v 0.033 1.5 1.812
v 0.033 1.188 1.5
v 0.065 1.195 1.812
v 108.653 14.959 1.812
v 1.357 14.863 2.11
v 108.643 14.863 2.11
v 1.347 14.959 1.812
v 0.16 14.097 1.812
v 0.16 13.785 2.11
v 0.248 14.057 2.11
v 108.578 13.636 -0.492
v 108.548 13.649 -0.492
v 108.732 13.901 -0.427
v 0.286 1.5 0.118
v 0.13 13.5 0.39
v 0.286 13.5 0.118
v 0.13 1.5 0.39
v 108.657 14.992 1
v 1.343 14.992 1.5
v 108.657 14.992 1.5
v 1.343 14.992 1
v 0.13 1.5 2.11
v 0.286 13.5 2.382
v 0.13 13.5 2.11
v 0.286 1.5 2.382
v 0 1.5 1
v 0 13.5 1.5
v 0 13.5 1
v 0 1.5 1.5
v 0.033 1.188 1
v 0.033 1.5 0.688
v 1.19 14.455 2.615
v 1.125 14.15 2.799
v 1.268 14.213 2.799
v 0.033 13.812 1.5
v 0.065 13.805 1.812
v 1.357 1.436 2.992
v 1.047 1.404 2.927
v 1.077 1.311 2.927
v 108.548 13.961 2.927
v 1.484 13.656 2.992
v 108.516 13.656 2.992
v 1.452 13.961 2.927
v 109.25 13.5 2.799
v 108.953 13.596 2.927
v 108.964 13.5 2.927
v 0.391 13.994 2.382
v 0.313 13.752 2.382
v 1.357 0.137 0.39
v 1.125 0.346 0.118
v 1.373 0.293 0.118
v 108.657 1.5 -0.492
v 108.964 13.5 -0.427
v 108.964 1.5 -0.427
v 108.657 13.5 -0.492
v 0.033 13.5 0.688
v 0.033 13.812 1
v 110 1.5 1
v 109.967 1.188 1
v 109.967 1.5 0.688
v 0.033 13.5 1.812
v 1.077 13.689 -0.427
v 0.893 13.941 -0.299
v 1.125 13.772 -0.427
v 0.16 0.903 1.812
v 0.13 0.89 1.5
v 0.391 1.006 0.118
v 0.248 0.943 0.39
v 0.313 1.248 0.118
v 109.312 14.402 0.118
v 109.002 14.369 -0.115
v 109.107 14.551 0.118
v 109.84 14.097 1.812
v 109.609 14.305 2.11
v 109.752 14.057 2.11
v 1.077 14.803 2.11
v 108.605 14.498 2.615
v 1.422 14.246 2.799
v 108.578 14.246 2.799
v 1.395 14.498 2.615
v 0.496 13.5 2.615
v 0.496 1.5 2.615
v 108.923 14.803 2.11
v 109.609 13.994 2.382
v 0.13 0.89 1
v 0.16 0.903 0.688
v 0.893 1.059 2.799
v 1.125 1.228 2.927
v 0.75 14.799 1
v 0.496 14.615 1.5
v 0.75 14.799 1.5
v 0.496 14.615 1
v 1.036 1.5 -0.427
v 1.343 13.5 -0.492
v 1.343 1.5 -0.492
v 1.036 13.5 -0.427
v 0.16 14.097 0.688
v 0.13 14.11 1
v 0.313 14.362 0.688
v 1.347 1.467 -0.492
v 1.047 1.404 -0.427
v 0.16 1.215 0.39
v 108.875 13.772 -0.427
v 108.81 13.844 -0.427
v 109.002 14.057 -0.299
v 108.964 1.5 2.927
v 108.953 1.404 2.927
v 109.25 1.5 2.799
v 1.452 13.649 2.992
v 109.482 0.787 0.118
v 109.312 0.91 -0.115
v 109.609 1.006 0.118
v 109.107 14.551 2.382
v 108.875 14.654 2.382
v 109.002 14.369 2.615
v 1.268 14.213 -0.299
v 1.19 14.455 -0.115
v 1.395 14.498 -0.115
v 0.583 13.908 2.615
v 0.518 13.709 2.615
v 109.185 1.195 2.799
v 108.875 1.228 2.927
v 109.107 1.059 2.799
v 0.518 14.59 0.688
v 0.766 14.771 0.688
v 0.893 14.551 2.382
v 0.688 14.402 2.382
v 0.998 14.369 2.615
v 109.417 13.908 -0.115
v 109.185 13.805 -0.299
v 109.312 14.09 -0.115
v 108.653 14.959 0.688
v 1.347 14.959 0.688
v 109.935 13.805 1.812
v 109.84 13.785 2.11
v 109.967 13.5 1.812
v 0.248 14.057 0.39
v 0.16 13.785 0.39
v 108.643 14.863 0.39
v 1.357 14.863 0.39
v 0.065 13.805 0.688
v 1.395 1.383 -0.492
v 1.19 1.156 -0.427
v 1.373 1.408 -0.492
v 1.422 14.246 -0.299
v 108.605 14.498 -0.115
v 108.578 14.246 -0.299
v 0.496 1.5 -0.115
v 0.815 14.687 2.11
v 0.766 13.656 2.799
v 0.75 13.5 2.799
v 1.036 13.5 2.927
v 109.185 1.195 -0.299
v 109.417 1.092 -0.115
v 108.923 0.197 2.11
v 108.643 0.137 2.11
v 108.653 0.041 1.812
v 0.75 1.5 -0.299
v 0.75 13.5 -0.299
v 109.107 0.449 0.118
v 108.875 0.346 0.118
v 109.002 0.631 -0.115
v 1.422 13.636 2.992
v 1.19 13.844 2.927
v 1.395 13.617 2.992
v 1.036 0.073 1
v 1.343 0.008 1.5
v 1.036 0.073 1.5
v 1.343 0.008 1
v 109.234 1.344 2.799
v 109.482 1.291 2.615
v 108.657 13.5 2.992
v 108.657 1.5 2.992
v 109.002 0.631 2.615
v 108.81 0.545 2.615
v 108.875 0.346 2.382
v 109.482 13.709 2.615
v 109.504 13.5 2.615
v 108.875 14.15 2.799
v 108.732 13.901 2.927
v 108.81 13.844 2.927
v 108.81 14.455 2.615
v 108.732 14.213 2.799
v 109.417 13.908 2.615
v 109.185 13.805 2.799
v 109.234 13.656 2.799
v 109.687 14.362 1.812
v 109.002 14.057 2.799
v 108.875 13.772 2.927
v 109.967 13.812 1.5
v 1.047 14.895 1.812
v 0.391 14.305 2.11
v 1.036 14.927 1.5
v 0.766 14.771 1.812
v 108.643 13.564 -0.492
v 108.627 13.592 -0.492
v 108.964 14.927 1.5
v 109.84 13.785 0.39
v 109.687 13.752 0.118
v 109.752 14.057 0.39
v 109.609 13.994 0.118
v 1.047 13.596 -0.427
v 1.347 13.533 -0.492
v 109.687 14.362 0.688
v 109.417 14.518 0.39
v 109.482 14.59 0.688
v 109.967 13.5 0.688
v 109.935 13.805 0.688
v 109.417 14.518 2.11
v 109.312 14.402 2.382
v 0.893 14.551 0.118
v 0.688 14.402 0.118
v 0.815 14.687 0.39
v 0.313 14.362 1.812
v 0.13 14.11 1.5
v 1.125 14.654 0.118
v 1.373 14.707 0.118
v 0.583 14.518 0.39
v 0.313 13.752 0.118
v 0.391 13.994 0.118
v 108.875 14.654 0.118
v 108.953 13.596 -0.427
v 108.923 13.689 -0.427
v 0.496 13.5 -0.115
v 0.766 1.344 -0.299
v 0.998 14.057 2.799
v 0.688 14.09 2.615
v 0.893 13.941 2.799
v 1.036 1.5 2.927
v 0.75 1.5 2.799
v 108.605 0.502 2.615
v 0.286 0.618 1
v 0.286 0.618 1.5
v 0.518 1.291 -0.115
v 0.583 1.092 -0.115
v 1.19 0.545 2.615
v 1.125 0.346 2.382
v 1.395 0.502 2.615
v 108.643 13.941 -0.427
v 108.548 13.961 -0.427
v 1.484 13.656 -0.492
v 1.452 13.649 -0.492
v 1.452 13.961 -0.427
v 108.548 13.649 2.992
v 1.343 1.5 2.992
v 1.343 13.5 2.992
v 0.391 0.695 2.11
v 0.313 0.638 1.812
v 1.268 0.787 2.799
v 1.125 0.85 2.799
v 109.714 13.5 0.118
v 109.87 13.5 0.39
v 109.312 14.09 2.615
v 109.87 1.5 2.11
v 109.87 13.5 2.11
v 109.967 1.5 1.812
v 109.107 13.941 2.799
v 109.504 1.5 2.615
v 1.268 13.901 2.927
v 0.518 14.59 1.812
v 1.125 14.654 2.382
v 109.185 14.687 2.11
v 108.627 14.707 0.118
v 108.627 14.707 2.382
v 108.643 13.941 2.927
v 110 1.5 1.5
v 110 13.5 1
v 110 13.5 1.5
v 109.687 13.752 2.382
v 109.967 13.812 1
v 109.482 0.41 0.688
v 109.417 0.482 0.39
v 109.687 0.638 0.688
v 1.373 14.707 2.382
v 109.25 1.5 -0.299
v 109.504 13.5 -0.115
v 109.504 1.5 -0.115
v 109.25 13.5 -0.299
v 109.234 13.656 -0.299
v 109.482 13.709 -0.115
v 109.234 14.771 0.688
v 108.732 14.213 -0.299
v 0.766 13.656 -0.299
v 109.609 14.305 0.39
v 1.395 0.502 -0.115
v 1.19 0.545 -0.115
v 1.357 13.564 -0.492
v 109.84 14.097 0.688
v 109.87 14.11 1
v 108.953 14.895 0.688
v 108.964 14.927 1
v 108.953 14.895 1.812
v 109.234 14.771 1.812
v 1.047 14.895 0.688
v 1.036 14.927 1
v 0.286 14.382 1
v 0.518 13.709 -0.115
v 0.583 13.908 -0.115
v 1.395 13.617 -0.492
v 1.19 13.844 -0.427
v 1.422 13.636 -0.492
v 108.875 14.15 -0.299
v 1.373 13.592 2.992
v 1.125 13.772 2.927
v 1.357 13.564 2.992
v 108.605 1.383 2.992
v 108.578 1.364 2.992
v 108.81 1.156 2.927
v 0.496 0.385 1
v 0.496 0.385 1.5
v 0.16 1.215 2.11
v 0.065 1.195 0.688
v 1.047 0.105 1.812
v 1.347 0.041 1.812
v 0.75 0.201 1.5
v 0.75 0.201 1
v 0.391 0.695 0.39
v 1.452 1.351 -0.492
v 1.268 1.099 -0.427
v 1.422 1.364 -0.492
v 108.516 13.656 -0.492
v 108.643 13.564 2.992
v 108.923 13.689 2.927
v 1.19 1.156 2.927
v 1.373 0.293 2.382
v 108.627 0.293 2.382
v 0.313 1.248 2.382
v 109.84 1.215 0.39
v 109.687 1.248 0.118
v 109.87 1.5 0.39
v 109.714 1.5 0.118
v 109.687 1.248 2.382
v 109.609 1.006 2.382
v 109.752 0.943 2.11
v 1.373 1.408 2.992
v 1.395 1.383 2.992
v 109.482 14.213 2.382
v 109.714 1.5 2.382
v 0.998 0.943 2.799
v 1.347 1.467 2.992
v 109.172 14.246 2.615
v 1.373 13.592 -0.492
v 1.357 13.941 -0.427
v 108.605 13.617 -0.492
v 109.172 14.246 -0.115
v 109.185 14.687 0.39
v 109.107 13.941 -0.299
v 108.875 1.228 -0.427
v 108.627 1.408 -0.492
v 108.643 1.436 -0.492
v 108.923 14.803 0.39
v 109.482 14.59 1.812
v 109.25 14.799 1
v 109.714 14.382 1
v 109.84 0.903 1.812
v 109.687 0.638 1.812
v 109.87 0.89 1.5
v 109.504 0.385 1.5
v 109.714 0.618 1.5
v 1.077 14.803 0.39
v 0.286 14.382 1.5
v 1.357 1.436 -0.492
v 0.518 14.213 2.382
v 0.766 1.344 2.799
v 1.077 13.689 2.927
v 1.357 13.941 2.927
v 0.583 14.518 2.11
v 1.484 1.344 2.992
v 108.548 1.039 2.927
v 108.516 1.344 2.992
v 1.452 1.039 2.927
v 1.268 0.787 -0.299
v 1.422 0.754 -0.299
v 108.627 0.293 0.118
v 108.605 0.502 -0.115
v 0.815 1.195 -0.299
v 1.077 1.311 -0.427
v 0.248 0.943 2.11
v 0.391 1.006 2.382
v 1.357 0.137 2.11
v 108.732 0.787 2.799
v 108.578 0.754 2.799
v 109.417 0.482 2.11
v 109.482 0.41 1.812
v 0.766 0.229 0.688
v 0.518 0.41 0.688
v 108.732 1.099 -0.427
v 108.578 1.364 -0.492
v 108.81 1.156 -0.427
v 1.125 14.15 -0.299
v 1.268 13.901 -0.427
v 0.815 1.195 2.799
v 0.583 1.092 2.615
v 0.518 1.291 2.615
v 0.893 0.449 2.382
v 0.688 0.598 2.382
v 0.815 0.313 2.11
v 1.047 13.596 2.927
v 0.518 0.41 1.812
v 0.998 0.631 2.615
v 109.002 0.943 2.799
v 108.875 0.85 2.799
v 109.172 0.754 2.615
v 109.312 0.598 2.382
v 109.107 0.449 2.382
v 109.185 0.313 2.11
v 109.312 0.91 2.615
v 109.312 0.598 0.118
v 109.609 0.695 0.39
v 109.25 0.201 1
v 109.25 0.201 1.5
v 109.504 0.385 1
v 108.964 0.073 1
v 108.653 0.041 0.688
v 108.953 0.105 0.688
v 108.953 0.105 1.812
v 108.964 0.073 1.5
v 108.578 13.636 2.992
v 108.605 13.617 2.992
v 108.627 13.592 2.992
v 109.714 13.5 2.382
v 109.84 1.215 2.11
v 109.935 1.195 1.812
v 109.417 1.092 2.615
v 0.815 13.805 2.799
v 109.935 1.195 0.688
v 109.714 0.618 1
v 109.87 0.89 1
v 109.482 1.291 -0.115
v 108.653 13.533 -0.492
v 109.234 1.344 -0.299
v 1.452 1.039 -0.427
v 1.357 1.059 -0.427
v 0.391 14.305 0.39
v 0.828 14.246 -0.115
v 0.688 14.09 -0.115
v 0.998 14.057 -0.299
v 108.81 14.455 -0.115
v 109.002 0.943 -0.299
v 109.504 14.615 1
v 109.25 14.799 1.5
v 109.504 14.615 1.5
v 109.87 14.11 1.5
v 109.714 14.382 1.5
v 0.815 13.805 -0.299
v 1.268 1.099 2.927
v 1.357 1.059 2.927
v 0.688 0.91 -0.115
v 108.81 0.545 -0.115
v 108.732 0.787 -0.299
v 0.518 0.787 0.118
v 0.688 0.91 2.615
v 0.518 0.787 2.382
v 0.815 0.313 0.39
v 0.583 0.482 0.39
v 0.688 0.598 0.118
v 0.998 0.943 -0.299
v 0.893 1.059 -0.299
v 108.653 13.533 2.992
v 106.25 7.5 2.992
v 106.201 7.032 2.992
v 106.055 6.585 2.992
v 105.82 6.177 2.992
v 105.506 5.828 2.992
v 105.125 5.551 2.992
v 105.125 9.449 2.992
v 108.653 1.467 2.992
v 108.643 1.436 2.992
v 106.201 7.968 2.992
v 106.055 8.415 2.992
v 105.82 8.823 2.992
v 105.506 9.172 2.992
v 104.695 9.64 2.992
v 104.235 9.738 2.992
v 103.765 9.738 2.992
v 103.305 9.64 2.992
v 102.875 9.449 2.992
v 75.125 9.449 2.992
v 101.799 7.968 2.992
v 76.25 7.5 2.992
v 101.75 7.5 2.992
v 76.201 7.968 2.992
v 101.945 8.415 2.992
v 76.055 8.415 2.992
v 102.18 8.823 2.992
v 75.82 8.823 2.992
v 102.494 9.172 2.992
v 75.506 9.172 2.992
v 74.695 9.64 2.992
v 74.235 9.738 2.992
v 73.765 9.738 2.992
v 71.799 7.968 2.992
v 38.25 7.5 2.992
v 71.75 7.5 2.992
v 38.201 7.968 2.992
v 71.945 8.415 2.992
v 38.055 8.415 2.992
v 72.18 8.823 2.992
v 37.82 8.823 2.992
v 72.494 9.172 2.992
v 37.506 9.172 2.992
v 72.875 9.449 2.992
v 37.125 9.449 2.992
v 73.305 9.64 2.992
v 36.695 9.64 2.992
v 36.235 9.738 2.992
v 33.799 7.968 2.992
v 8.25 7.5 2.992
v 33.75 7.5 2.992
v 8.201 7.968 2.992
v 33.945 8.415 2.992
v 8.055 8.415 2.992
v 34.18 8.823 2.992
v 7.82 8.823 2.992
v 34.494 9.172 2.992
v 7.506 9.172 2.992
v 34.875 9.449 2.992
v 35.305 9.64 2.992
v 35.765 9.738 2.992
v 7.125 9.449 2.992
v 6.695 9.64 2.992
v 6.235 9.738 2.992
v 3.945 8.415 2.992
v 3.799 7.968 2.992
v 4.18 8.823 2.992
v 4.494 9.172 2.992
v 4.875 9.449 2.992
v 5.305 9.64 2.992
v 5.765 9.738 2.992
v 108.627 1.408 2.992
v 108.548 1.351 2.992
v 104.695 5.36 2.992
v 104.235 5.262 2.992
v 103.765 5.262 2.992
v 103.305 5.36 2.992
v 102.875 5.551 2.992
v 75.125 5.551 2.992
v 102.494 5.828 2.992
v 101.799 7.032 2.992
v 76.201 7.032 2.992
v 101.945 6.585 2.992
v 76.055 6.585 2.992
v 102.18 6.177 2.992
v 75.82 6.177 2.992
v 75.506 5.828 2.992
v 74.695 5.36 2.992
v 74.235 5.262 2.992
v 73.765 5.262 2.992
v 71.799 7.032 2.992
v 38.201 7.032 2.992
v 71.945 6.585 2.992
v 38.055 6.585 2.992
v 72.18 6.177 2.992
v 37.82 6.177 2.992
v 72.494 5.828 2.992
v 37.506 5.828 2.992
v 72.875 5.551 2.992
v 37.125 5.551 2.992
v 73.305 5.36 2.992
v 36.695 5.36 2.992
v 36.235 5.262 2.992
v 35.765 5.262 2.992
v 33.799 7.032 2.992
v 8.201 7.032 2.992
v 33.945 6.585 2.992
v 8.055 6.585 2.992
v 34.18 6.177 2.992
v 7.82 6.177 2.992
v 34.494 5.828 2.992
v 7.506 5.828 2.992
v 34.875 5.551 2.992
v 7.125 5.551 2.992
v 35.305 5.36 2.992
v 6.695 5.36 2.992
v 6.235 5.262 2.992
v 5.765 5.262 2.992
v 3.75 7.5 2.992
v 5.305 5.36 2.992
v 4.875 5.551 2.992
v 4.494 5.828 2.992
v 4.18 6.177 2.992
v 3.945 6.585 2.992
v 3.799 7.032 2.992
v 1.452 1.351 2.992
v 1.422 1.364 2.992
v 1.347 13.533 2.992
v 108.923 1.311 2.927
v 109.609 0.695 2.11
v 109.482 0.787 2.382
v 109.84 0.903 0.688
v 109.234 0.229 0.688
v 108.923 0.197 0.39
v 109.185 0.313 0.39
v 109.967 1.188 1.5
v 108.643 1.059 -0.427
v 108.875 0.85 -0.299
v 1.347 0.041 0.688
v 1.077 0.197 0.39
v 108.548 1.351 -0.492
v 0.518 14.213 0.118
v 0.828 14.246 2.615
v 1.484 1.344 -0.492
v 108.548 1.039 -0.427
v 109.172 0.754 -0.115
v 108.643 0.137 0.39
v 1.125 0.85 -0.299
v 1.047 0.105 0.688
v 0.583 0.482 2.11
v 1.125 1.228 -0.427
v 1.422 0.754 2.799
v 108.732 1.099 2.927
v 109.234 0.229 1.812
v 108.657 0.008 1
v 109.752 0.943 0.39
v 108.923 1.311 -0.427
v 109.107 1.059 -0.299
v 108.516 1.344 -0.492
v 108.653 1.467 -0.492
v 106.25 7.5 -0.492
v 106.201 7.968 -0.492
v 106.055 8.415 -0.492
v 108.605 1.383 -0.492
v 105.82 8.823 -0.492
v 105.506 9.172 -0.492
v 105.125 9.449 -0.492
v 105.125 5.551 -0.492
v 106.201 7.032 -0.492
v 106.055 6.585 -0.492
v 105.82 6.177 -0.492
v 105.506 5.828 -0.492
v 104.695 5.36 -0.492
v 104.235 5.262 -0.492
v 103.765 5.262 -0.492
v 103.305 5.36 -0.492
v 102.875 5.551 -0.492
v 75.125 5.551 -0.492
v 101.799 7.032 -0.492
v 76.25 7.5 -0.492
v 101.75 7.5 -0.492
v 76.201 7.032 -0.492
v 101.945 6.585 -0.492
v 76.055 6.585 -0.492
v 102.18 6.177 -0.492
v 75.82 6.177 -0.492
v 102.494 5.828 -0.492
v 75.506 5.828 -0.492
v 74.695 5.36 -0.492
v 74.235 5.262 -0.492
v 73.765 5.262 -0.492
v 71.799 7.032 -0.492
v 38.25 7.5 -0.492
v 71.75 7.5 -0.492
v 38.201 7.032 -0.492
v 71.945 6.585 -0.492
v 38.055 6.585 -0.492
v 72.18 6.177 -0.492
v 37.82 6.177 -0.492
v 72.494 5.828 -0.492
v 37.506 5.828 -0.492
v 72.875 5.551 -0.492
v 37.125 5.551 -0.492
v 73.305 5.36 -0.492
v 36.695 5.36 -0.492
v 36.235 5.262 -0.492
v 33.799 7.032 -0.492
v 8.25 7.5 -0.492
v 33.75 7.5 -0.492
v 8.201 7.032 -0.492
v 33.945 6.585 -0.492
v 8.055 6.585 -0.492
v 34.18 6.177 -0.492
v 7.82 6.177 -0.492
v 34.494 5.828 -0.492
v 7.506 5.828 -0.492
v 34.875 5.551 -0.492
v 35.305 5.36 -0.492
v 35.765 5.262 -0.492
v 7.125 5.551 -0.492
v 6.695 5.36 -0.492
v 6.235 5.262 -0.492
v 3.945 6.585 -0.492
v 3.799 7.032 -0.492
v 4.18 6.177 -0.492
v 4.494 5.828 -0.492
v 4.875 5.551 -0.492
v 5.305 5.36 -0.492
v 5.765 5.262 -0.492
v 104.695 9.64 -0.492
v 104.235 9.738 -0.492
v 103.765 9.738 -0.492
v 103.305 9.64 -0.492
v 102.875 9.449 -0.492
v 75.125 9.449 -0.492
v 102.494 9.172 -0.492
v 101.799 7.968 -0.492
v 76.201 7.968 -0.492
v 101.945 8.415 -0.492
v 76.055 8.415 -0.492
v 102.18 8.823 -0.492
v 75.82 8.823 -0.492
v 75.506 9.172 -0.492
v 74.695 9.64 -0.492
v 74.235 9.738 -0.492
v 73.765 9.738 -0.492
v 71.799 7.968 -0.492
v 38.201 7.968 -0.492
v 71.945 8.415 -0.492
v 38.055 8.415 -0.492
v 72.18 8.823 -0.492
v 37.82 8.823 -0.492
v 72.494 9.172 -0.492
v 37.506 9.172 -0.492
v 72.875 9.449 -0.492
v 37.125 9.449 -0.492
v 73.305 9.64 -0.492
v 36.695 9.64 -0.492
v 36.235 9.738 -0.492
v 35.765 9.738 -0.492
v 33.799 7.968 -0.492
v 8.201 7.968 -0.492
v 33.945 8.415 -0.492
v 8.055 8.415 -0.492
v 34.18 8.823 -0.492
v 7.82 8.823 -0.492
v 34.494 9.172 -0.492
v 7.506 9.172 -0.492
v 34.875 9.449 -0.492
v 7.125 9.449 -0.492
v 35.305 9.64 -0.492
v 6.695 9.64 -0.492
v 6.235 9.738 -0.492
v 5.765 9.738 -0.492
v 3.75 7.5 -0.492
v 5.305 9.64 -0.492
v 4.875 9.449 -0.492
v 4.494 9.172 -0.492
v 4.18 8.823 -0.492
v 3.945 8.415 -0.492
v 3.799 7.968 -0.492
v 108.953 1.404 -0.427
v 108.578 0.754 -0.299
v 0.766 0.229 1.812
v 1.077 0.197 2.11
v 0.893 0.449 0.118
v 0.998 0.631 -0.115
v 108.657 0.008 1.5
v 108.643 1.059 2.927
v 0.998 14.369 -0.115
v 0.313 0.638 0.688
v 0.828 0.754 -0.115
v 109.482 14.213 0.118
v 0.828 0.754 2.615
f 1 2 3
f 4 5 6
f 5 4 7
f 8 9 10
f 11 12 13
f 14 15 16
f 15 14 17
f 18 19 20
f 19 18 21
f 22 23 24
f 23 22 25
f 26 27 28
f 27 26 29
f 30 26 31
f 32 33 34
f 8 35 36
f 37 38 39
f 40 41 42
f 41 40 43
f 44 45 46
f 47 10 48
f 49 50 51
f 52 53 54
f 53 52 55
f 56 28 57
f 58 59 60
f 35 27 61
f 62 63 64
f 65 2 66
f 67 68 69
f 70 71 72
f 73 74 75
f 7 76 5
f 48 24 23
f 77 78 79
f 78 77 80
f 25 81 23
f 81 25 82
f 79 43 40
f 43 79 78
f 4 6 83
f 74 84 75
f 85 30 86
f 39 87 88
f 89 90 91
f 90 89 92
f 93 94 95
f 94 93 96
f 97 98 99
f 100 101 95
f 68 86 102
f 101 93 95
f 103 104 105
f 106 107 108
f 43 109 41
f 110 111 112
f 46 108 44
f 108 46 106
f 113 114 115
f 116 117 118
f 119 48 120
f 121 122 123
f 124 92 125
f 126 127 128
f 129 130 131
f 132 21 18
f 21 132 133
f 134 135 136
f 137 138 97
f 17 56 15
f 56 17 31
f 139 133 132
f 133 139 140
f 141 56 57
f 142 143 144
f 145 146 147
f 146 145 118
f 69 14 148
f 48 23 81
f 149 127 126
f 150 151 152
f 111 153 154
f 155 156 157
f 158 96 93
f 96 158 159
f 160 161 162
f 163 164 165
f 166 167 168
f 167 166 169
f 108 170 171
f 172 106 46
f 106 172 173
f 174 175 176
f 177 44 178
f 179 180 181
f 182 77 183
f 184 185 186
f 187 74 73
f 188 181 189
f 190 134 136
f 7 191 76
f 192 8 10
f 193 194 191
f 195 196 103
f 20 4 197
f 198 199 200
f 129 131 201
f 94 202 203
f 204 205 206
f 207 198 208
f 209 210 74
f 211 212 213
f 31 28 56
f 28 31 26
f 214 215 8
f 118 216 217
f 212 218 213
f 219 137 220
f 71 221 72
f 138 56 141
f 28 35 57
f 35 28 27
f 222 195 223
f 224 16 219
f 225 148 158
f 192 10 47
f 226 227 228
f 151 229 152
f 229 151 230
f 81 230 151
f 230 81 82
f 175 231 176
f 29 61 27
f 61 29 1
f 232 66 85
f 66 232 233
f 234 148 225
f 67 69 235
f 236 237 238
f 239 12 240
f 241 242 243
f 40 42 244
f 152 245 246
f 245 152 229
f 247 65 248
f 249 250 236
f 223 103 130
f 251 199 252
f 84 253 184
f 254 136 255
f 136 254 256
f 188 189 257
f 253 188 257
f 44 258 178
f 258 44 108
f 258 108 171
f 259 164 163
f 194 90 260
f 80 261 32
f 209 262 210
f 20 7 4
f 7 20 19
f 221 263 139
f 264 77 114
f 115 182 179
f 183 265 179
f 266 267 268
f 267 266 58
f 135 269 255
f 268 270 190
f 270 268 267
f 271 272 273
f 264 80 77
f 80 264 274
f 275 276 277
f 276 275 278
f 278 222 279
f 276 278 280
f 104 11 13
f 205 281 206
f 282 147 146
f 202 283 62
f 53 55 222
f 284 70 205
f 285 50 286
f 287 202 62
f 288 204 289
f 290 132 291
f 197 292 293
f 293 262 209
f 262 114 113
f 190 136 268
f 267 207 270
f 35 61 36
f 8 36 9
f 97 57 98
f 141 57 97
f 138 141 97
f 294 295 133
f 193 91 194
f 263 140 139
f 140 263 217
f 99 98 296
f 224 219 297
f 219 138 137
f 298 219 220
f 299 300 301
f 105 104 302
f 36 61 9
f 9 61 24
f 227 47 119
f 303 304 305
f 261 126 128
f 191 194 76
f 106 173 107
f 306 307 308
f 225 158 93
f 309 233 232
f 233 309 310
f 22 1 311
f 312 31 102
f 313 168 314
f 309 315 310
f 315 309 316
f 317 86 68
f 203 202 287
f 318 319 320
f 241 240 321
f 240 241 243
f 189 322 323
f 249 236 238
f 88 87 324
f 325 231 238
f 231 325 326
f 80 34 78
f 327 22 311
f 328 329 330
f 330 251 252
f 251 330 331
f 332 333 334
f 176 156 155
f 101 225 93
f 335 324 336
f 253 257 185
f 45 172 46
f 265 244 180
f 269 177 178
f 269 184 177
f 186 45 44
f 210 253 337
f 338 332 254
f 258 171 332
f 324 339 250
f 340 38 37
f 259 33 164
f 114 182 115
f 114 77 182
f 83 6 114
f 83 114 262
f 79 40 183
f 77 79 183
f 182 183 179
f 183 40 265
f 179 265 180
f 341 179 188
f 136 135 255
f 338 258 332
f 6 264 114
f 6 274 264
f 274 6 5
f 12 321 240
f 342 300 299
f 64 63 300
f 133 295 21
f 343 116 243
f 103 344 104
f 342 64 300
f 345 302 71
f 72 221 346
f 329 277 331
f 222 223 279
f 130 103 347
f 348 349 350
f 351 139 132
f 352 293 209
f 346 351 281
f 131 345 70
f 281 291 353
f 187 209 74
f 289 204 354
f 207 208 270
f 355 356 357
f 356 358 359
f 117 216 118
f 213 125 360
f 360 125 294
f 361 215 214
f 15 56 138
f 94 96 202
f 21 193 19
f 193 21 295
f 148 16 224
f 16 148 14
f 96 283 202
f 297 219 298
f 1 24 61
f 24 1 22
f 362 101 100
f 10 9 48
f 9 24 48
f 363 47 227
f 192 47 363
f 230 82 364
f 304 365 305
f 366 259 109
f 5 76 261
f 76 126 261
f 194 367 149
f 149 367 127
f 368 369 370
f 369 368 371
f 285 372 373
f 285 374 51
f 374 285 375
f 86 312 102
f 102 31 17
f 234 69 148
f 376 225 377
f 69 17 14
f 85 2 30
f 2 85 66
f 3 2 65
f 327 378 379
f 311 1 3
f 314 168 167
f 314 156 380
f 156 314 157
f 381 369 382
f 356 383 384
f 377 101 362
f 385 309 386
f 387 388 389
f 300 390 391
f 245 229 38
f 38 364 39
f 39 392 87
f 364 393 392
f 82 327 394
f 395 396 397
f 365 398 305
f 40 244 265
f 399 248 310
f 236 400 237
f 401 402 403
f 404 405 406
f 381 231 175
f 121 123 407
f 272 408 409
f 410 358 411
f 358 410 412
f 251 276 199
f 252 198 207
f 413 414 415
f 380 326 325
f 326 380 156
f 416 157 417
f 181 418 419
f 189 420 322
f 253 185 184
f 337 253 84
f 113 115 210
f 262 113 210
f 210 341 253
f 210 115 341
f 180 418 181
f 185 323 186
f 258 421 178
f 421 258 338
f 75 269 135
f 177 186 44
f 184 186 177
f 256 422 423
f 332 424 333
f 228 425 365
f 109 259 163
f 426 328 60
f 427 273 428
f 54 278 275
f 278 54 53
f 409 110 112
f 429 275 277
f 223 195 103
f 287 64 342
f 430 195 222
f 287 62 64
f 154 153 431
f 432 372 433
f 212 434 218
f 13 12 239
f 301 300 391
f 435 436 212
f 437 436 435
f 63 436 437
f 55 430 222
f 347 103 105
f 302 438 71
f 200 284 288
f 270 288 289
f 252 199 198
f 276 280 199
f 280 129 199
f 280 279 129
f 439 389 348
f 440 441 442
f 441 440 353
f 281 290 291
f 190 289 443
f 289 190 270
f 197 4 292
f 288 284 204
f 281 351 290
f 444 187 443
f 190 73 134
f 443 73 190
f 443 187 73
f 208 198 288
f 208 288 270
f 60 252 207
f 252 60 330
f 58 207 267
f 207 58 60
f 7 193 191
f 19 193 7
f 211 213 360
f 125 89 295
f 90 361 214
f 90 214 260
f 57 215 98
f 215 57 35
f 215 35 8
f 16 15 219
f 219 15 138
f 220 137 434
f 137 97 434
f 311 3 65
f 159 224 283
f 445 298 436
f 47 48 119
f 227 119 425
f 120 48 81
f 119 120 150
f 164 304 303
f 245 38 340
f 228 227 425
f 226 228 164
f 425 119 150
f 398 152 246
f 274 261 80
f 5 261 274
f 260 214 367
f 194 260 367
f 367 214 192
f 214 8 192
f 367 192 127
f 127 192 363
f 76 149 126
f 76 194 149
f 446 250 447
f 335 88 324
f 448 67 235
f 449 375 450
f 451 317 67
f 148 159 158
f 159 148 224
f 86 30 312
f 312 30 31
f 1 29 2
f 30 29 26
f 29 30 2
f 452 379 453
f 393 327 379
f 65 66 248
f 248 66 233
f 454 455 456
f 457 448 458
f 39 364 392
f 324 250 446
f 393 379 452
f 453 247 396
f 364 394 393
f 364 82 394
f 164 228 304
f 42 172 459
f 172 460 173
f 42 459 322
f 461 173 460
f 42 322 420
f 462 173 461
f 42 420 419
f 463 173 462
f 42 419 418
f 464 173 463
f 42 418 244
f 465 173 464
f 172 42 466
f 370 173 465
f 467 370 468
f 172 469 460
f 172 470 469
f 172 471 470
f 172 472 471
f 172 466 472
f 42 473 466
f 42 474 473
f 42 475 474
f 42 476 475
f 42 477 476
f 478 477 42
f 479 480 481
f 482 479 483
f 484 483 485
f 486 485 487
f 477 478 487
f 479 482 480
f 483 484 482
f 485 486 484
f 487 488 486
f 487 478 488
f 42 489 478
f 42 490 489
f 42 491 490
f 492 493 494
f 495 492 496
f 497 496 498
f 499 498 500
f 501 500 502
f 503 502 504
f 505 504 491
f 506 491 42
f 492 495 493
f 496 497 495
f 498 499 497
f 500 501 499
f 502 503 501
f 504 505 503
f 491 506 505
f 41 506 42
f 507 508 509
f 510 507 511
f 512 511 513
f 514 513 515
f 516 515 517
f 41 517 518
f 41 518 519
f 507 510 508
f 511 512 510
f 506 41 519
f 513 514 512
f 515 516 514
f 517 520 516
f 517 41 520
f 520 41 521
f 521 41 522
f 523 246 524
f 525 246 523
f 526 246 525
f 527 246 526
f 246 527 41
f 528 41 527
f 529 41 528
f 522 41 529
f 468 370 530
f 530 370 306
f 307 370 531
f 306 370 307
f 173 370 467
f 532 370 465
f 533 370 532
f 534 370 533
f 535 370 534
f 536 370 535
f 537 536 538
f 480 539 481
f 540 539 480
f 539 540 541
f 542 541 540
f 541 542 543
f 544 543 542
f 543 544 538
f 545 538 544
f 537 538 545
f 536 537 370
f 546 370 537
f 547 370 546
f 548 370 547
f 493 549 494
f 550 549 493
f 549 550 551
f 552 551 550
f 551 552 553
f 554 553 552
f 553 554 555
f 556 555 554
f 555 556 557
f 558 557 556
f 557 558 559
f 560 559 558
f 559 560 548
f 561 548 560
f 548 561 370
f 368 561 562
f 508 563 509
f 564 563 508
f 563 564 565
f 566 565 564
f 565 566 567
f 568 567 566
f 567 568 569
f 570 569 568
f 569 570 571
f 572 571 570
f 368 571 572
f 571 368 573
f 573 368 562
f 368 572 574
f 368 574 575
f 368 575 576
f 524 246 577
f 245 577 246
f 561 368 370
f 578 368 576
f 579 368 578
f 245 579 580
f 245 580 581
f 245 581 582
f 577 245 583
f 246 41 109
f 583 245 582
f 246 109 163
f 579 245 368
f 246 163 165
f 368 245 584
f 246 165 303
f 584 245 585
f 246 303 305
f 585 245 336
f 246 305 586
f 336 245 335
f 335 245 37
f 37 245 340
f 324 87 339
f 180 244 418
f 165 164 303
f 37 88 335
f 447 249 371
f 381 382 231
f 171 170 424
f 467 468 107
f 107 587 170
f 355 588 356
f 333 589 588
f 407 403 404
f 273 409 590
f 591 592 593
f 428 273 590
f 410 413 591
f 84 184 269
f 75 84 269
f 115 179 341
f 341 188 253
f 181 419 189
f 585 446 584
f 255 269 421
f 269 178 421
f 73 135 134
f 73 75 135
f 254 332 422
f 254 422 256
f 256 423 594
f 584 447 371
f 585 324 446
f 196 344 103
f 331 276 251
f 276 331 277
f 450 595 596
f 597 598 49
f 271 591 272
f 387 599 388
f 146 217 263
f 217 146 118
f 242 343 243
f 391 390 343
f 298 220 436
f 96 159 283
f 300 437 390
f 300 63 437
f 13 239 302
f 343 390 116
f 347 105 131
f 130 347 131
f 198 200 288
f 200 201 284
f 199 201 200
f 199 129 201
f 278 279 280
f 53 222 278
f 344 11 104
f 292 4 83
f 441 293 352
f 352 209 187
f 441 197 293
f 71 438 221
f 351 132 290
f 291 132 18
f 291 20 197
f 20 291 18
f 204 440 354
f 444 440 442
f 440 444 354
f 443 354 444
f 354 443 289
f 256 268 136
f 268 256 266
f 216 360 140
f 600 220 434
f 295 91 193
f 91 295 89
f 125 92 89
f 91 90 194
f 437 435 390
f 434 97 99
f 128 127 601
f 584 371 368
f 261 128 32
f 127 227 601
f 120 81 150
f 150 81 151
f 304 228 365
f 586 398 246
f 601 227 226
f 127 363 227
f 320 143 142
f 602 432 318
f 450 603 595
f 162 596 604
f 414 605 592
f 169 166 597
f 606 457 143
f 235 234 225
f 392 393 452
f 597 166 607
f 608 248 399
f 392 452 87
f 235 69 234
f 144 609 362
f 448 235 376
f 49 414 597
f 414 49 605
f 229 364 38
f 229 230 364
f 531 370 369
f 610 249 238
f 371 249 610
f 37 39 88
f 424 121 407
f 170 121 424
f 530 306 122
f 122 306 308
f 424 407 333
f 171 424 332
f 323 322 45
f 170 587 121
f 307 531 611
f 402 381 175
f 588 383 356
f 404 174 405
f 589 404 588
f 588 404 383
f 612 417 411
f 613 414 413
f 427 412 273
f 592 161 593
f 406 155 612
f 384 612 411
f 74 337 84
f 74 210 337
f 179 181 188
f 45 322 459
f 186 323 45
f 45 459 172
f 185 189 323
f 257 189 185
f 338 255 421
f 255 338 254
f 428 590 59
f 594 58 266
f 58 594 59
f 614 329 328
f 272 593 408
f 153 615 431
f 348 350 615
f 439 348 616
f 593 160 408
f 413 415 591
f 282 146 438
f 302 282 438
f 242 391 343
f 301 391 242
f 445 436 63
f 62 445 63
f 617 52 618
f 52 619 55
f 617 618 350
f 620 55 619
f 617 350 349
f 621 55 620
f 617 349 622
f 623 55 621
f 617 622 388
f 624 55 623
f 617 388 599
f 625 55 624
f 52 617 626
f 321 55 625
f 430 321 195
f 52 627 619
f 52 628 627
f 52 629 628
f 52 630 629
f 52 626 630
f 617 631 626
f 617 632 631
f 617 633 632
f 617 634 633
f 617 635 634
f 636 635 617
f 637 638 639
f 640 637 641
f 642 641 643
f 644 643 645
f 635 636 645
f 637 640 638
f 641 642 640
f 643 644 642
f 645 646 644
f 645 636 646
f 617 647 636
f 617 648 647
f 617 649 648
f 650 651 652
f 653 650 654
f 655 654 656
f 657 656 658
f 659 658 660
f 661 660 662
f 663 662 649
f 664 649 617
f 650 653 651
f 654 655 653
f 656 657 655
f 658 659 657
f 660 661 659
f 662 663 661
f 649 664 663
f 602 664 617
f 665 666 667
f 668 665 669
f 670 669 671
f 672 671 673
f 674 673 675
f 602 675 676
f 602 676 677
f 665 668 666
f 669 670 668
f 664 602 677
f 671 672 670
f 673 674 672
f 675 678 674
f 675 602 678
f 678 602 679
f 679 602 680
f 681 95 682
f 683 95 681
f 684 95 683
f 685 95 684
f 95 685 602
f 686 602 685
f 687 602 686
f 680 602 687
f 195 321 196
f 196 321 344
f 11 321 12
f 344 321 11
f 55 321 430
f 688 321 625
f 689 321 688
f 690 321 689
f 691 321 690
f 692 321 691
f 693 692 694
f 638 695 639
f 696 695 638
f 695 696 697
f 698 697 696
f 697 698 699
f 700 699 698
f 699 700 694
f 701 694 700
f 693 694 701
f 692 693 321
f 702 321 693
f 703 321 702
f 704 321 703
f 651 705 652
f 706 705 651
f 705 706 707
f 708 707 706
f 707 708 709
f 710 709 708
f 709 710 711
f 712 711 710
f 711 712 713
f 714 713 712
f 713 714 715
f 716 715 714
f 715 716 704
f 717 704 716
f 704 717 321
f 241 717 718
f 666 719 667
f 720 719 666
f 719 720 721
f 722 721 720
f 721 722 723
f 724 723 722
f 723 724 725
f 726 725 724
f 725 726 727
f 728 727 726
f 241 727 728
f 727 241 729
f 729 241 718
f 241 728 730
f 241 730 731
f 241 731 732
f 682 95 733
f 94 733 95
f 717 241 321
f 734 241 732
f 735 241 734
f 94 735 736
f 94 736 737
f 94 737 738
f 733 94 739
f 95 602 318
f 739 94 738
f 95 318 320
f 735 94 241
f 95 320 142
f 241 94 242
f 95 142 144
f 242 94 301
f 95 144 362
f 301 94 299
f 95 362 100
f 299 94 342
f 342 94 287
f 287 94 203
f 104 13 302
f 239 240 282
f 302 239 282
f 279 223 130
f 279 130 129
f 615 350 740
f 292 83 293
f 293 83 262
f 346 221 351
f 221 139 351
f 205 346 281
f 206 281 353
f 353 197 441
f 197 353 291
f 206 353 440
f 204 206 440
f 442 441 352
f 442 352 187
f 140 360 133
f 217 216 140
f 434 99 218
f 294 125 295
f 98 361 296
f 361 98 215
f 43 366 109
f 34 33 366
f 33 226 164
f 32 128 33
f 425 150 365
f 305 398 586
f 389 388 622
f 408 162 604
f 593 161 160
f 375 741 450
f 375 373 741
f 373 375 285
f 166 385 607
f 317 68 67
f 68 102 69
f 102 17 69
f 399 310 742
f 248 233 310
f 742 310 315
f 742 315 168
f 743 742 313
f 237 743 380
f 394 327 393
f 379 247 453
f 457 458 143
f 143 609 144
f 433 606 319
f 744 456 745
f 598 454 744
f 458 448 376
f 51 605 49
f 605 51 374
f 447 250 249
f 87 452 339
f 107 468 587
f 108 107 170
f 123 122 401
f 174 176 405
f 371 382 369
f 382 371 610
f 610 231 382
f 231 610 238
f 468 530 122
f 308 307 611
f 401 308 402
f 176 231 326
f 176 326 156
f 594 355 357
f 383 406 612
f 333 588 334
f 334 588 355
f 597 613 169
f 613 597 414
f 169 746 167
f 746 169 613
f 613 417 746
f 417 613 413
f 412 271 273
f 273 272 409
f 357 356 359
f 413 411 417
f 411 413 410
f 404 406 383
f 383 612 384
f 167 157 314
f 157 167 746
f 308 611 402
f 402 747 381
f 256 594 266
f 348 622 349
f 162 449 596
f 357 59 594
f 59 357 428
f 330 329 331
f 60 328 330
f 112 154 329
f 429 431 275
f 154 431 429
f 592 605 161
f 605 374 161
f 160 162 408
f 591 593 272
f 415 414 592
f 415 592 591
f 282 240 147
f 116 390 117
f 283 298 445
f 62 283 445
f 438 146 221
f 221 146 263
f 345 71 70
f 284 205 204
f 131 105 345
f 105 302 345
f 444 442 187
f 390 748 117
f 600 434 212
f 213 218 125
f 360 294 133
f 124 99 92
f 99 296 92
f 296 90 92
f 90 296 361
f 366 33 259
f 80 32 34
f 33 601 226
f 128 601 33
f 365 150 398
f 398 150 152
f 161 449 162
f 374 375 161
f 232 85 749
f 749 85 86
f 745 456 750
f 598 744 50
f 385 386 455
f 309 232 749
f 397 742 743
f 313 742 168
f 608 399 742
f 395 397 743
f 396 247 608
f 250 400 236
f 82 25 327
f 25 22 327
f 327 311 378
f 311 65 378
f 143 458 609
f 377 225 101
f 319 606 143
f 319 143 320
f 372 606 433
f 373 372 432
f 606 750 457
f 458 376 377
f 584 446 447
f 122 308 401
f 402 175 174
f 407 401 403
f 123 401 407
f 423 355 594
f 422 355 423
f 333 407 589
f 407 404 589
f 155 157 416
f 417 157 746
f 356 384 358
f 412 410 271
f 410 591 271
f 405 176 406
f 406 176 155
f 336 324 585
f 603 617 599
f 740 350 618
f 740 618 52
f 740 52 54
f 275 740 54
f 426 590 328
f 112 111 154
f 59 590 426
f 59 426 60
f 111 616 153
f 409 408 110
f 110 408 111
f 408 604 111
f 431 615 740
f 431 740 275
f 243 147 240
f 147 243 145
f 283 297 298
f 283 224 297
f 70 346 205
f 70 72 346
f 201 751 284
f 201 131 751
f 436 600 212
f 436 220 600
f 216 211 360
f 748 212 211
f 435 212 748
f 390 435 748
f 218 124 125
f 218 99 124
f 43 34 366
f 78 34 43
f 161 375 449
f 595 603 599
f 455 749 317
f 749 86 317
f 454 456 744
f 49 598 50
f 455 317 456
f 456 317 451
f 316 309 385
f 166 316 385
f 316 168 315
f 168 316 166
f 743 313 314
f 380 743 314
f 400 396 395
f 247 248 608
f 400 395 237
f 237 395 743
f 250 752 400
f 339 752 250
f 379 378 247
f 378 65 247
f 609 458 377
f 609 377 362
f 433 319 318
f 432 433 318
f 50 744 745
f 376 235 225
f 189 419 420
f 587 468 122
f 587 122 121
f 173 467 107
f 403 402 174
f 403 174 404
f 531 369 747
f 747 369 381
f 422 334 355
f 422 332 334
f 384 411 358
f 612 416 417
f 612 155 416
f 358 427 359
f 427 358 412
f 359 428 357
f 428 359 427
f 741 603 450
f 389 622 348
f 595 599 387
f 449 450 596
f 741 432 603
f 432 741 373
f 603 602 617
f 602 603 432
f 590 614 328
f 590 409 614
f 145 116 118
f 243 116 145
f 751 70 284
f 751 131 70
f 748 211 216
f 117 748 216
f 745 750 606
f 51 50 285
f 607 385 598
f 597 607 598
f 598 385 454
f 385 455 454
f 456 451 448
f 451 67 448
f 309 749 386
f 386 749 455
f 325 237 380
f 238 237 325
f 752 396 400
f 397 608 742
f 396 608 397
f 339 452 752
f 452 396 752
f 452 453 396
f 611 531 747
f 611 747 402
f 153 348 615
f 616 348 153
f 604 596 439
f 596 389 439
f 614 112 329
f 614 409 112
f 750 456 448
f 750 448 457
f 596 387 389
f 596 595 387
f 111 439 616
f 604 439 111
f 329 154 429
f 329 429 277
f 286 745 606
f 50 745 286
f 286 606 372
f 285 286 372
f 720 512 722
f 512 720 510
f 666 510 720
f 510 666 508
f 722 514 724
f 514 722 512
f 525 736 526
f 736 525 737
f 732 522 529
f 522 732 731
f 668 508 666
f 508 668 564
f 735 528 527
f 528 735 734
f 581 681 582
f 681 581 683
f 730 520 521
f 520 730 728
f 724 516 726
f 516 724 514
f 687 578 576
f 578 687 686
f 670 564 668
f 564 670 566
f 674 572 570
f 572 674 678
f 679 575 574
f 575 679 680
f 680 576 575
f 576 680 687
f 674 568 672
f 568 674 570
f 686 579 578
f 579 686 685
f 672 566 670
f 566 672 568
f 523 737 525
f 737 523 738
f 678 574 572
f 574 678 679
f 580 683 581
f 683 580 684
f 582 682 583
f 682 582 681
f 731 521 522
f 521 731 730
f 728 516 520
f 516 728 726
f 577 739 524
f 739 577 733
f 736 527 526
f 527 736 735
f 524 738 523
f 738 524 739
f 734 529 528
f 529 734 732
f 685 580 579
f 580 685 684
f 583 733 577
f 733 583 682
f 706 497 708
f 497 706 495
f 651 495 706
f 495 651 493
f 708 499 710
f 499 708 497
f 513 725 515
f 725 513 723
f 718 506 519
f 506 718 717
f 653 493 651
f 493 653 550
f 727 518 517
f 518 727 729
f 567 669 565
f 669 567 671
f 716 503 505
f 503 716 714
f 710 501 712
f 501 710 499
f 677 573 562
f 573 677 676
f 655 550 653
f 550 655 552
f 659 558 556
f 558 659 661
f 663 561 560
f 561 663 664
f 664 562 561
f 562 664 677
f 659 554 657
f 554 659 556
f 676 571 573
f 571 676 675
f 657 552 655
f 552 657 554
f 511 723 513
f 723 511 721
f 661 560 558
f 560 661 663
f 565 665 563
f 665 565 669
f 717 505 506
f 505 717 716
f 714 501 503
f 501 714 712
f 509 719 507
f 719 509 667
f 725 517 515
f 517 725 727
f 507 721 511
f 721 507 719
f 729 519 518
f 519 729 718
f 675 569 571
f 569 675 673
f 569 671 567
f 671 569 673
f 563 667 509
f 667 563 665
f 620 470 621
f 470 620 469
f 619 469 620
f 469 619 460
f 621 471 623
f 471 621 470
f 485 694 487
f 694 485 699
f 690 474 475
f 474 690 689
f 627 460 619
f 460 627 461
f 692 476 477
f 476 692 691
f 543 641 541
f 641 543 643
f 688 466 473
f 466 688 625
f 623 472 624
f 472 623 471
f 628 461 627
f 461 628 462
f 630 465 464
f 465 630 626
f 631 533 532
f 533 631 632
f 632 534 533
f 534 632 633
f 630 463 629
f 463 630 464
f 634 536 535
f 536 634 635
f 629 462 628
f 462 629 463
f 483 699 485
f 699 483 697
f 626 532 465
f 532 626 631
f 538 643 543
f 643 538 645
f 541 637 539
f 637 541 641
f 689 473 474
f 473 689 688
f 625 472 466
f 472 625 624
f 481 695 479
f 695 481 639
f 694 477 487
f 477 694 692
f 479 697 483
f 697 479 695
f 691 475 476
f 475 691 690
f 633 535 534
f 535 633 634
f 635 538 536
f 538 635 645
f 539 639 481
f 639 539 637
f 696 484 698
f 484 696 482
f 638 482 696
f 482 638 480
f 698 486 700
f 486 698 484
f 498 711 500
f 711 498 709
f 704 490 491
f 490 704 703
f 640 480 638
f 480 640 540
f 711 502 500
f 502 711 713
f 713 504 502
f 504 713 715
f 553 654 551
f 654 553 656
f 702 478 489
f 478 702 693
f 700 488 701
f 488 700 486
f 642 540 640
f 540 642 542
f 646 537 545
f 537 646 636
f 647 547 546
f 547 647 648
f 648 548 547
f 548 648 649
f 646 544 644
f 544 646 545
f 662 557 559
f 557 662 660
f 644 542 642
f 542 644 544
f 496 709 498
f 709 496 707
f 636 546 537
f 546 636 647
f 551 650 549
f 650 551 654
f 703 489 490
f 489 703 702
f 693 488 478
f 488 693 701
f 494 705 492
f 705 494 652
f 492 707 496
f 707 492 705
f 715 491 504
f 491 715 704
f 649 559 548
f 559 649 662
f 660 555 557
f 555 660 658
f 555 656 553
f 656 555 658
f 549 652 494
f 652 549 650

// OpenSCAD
// Higher definition curves
$fs = 0.2;

module roundedcube(size = [1, 1, 1], center = false, radius = 0.5, apply_to = "all") {
	// If single value, convert to [x, y, z] vector
	size = (size[0] == undef) ? [size, size, size] : size;

	translate_min = radius;
	translate_xmax = size[0] - radius;
	translate_ymax = size[1] - radius;
	translate_zmax = size[2] - radius;

	diameter = radius * 2;

	module build_point(type = "sphere", rotate = [0, 0, 0]) {
		if (type == "sphere") {
			sphere(r = radius);
		} else if (type == "cylinder") {
			rotate(a = rotate)
			cylinder(h = diameter, r = radius, center = true);
		}
	}

	obj_translate = (center == false) ?
		[0, 0, 0] : [
			-(size[0] / 2),
			-(size[1] / 2),
			-(size[2] / 2)
		];

	translate(v = obj_translate) {
		hull() {
			for (translate_x = [translate_min, translate_xmax]) {
				x_at = (translate_x == translate_min) ? "min" : "max";
				for (translate_y = [translate_min, translate_ymax]) {
					y_at = (translate_y == translate_min) ? "min" : "max";
					for (translate_z = [translate_min, translate_zmax]) {
						z_at = (translate_z == translate_min) ? "min" : "max";

						translate(v = [translate_x, translate_y, translate_z])
						if (
							(apply_to == "all") ||
							(apply_to == "xmin" && x_at == "min") || (apply_to == "xmax" && x_at == "max") ||
							(apply_to == "ymin" && y_at == "min") || (apply_to == "ymax" && y_at == "max") ||
							(apply_to == "zmin" && z_at == "min") || (apply_to == "zmax" && z_at == "max")
						) {
							build_point("sphere");
						} else {
							rotate = 
								(apply_to == "xmin" || apply_to == "xmax" || apply_to == "x") ? [0, 90, 0] : (
								(apply_to == "ymin" || apply_to == "ymax" || apply_to == "y") ? [90, 90, 0] :
								[0, 0, 0]
							);
							build_point("cylinder", rotate);
						}
					}
				}
			}
		}
	}
}

thin_side = 3;
thick_side = 11;
wall_thickness = 2.5;
height = 40;
corner_radius = 1.5;
thin_side_length = 60;
thick_side_length = 60;

thin_side_width = thin_side + 2 * wall_thickness;
thick_side_width = thick_side+2*wall_thickness;
roof_thickness = wall_thickness;
module basket_corner_holder(){

difference(){
    union(){
    //thin side
    roundedcube([thin_side_length, thin_side_width ,height], center = false, radius = corner_radius);

    //thick side


    roundedcube([thick_side_width, thick_side_length, height], center = false, radius = corner_radius);
    }
    
translate([wall_thickness, wall_thickness, 0])
cube([thin_side_length+20, thin_side ,height-roof_thickness]);
translate([wall_thickness, wall_thickness, 0])
cube([thick_side, thick_side_length+20, height-roof_thickness]);
}
friction_cylinder_d = 1.5;
friction_cylinder_r = friction_cylinder_d/2;
distance_between_friction_cylinders = friction_cylinder_d * 2.5;
num_friction_cylinder_thick_side = (height)/distance_between_friction_cylinders-1;

//thick side
thick_side_cylinder_height =  thick_side_length - thin_side_width;
for (i=[0:num_friction_cylinder_thick_side]){
    translate([wall_thickness,thick_side_length,distance_between_friction_cylinders*i+distance_between_friction_cylinders/2])
    rotate([90,0,0])
    cylinder(thick_side_cylinder_height, d=friction_cylinder_d);
}

for (i=[0:num_friction_cylinder_thick_side]){
    translate([thick_side_width-wall_thickness,thick_side_length,distance_between_friction_cylinders*i+distance_between_friction_cylinders/2])
    rotate([90,0,0])
    cylinder(thick_side_cylinder_height, d=friction_cylinder_d);
}
//
//thin side
friction_cylinder_thin_d = 1;
friction_cylinder_thin_r = friction_cylinder_thin_d/2;
distance_between_friction_thin_cylinders = friction_cylinder_thin_d*2.5;
num_friction_cylinder_thin_side = (height)/distance_between_friction_thin_cylinders-1;
thin_side_cylinder_height =  thin_side_length - thick_side_width;
for (i=[0:num_friction_cylinder_thin_side]){
    translate([thin_side_length,wall_thickness , distance_between_friction_thin_cylinders*i + distance_between_friction_thin_cylinders/2])
    rotate([0,-90,0])
    cylinder(thin_side_cylinder_height, d=friction_cylinder_thin_d);
}

for (i=[0:num_friction_cylinder_thin_side]){
    translate([thin_side_length,thin_side_width-wall_thickness , distance_between_friction_thin_cylinders*i + distance_between_friction_thin_cylinders/2])
    rotate([0,-90,0])
    cylinder(thin_side_cylinder_height, d=friction_cylinder_thin_d);
}
}
module ziptie_hole(ziptie_width = 5.5) {
translate([0,0,height/5])
rotate([-90,0,0])
cylinder(50, d=ziptie_width);

translate([0,0,height+roof_thickness/3])
rotate([-90,0,0])
cylinder(50, d=ziptie_width);
    
    }
    /*
difference(){
    
basket_corner_holder();
translate([thick_side_width+(thin_side_length-thick_side_width)/2,-1,height/2])
rotate([-90,0,0])
cylinder(50, d=height*0.45);
translate([-1, thin_side_width+(thick_side_length-thin_side_width)/2, height/2])
rotate([0,90,0])
cylinder(50, d=height*0.45);
    translate([thin_side_length-10,-1, 0])
ziptie_hole();
translate([20,-1, 0])
ziptie_hole();
    
    translate([-1,20, 0])
rotate([0,0,-90])
ziptie_hole();

translate([-1,50, 0])
rotate([0,0,-90])
ziptie_hole(4.5);
}
*/

holes_distance = thin_side_length-30;
stablizer_length = 110;
stablizer_width = 15;
stablizer_height = wall_thickness;
hole_diameter = 4.5;
distance_to_edge=6;

difference(){
roundedcube([stablizer_length, stablizer_width, stablizer_height], center = false, radius = corner_radius);
    translate([distance_to_edge, stablizer_width/2,-1])
cylinder(50, d=hole_diameter);
translate([distance_to_edge + holes_distance, stablizer_width/2,-1])
cylinder(50, d=hole_diameter);
translate([stablizer_length-distance_to_edge, stablizer_width/2,-1])
cylinder(50, d=hole_diameter);
    translate([stablizer_length-distance_to_edge-holes_distance, stablizer_width/2,-1])
cylinder(50, d=hole_diameter);
}
